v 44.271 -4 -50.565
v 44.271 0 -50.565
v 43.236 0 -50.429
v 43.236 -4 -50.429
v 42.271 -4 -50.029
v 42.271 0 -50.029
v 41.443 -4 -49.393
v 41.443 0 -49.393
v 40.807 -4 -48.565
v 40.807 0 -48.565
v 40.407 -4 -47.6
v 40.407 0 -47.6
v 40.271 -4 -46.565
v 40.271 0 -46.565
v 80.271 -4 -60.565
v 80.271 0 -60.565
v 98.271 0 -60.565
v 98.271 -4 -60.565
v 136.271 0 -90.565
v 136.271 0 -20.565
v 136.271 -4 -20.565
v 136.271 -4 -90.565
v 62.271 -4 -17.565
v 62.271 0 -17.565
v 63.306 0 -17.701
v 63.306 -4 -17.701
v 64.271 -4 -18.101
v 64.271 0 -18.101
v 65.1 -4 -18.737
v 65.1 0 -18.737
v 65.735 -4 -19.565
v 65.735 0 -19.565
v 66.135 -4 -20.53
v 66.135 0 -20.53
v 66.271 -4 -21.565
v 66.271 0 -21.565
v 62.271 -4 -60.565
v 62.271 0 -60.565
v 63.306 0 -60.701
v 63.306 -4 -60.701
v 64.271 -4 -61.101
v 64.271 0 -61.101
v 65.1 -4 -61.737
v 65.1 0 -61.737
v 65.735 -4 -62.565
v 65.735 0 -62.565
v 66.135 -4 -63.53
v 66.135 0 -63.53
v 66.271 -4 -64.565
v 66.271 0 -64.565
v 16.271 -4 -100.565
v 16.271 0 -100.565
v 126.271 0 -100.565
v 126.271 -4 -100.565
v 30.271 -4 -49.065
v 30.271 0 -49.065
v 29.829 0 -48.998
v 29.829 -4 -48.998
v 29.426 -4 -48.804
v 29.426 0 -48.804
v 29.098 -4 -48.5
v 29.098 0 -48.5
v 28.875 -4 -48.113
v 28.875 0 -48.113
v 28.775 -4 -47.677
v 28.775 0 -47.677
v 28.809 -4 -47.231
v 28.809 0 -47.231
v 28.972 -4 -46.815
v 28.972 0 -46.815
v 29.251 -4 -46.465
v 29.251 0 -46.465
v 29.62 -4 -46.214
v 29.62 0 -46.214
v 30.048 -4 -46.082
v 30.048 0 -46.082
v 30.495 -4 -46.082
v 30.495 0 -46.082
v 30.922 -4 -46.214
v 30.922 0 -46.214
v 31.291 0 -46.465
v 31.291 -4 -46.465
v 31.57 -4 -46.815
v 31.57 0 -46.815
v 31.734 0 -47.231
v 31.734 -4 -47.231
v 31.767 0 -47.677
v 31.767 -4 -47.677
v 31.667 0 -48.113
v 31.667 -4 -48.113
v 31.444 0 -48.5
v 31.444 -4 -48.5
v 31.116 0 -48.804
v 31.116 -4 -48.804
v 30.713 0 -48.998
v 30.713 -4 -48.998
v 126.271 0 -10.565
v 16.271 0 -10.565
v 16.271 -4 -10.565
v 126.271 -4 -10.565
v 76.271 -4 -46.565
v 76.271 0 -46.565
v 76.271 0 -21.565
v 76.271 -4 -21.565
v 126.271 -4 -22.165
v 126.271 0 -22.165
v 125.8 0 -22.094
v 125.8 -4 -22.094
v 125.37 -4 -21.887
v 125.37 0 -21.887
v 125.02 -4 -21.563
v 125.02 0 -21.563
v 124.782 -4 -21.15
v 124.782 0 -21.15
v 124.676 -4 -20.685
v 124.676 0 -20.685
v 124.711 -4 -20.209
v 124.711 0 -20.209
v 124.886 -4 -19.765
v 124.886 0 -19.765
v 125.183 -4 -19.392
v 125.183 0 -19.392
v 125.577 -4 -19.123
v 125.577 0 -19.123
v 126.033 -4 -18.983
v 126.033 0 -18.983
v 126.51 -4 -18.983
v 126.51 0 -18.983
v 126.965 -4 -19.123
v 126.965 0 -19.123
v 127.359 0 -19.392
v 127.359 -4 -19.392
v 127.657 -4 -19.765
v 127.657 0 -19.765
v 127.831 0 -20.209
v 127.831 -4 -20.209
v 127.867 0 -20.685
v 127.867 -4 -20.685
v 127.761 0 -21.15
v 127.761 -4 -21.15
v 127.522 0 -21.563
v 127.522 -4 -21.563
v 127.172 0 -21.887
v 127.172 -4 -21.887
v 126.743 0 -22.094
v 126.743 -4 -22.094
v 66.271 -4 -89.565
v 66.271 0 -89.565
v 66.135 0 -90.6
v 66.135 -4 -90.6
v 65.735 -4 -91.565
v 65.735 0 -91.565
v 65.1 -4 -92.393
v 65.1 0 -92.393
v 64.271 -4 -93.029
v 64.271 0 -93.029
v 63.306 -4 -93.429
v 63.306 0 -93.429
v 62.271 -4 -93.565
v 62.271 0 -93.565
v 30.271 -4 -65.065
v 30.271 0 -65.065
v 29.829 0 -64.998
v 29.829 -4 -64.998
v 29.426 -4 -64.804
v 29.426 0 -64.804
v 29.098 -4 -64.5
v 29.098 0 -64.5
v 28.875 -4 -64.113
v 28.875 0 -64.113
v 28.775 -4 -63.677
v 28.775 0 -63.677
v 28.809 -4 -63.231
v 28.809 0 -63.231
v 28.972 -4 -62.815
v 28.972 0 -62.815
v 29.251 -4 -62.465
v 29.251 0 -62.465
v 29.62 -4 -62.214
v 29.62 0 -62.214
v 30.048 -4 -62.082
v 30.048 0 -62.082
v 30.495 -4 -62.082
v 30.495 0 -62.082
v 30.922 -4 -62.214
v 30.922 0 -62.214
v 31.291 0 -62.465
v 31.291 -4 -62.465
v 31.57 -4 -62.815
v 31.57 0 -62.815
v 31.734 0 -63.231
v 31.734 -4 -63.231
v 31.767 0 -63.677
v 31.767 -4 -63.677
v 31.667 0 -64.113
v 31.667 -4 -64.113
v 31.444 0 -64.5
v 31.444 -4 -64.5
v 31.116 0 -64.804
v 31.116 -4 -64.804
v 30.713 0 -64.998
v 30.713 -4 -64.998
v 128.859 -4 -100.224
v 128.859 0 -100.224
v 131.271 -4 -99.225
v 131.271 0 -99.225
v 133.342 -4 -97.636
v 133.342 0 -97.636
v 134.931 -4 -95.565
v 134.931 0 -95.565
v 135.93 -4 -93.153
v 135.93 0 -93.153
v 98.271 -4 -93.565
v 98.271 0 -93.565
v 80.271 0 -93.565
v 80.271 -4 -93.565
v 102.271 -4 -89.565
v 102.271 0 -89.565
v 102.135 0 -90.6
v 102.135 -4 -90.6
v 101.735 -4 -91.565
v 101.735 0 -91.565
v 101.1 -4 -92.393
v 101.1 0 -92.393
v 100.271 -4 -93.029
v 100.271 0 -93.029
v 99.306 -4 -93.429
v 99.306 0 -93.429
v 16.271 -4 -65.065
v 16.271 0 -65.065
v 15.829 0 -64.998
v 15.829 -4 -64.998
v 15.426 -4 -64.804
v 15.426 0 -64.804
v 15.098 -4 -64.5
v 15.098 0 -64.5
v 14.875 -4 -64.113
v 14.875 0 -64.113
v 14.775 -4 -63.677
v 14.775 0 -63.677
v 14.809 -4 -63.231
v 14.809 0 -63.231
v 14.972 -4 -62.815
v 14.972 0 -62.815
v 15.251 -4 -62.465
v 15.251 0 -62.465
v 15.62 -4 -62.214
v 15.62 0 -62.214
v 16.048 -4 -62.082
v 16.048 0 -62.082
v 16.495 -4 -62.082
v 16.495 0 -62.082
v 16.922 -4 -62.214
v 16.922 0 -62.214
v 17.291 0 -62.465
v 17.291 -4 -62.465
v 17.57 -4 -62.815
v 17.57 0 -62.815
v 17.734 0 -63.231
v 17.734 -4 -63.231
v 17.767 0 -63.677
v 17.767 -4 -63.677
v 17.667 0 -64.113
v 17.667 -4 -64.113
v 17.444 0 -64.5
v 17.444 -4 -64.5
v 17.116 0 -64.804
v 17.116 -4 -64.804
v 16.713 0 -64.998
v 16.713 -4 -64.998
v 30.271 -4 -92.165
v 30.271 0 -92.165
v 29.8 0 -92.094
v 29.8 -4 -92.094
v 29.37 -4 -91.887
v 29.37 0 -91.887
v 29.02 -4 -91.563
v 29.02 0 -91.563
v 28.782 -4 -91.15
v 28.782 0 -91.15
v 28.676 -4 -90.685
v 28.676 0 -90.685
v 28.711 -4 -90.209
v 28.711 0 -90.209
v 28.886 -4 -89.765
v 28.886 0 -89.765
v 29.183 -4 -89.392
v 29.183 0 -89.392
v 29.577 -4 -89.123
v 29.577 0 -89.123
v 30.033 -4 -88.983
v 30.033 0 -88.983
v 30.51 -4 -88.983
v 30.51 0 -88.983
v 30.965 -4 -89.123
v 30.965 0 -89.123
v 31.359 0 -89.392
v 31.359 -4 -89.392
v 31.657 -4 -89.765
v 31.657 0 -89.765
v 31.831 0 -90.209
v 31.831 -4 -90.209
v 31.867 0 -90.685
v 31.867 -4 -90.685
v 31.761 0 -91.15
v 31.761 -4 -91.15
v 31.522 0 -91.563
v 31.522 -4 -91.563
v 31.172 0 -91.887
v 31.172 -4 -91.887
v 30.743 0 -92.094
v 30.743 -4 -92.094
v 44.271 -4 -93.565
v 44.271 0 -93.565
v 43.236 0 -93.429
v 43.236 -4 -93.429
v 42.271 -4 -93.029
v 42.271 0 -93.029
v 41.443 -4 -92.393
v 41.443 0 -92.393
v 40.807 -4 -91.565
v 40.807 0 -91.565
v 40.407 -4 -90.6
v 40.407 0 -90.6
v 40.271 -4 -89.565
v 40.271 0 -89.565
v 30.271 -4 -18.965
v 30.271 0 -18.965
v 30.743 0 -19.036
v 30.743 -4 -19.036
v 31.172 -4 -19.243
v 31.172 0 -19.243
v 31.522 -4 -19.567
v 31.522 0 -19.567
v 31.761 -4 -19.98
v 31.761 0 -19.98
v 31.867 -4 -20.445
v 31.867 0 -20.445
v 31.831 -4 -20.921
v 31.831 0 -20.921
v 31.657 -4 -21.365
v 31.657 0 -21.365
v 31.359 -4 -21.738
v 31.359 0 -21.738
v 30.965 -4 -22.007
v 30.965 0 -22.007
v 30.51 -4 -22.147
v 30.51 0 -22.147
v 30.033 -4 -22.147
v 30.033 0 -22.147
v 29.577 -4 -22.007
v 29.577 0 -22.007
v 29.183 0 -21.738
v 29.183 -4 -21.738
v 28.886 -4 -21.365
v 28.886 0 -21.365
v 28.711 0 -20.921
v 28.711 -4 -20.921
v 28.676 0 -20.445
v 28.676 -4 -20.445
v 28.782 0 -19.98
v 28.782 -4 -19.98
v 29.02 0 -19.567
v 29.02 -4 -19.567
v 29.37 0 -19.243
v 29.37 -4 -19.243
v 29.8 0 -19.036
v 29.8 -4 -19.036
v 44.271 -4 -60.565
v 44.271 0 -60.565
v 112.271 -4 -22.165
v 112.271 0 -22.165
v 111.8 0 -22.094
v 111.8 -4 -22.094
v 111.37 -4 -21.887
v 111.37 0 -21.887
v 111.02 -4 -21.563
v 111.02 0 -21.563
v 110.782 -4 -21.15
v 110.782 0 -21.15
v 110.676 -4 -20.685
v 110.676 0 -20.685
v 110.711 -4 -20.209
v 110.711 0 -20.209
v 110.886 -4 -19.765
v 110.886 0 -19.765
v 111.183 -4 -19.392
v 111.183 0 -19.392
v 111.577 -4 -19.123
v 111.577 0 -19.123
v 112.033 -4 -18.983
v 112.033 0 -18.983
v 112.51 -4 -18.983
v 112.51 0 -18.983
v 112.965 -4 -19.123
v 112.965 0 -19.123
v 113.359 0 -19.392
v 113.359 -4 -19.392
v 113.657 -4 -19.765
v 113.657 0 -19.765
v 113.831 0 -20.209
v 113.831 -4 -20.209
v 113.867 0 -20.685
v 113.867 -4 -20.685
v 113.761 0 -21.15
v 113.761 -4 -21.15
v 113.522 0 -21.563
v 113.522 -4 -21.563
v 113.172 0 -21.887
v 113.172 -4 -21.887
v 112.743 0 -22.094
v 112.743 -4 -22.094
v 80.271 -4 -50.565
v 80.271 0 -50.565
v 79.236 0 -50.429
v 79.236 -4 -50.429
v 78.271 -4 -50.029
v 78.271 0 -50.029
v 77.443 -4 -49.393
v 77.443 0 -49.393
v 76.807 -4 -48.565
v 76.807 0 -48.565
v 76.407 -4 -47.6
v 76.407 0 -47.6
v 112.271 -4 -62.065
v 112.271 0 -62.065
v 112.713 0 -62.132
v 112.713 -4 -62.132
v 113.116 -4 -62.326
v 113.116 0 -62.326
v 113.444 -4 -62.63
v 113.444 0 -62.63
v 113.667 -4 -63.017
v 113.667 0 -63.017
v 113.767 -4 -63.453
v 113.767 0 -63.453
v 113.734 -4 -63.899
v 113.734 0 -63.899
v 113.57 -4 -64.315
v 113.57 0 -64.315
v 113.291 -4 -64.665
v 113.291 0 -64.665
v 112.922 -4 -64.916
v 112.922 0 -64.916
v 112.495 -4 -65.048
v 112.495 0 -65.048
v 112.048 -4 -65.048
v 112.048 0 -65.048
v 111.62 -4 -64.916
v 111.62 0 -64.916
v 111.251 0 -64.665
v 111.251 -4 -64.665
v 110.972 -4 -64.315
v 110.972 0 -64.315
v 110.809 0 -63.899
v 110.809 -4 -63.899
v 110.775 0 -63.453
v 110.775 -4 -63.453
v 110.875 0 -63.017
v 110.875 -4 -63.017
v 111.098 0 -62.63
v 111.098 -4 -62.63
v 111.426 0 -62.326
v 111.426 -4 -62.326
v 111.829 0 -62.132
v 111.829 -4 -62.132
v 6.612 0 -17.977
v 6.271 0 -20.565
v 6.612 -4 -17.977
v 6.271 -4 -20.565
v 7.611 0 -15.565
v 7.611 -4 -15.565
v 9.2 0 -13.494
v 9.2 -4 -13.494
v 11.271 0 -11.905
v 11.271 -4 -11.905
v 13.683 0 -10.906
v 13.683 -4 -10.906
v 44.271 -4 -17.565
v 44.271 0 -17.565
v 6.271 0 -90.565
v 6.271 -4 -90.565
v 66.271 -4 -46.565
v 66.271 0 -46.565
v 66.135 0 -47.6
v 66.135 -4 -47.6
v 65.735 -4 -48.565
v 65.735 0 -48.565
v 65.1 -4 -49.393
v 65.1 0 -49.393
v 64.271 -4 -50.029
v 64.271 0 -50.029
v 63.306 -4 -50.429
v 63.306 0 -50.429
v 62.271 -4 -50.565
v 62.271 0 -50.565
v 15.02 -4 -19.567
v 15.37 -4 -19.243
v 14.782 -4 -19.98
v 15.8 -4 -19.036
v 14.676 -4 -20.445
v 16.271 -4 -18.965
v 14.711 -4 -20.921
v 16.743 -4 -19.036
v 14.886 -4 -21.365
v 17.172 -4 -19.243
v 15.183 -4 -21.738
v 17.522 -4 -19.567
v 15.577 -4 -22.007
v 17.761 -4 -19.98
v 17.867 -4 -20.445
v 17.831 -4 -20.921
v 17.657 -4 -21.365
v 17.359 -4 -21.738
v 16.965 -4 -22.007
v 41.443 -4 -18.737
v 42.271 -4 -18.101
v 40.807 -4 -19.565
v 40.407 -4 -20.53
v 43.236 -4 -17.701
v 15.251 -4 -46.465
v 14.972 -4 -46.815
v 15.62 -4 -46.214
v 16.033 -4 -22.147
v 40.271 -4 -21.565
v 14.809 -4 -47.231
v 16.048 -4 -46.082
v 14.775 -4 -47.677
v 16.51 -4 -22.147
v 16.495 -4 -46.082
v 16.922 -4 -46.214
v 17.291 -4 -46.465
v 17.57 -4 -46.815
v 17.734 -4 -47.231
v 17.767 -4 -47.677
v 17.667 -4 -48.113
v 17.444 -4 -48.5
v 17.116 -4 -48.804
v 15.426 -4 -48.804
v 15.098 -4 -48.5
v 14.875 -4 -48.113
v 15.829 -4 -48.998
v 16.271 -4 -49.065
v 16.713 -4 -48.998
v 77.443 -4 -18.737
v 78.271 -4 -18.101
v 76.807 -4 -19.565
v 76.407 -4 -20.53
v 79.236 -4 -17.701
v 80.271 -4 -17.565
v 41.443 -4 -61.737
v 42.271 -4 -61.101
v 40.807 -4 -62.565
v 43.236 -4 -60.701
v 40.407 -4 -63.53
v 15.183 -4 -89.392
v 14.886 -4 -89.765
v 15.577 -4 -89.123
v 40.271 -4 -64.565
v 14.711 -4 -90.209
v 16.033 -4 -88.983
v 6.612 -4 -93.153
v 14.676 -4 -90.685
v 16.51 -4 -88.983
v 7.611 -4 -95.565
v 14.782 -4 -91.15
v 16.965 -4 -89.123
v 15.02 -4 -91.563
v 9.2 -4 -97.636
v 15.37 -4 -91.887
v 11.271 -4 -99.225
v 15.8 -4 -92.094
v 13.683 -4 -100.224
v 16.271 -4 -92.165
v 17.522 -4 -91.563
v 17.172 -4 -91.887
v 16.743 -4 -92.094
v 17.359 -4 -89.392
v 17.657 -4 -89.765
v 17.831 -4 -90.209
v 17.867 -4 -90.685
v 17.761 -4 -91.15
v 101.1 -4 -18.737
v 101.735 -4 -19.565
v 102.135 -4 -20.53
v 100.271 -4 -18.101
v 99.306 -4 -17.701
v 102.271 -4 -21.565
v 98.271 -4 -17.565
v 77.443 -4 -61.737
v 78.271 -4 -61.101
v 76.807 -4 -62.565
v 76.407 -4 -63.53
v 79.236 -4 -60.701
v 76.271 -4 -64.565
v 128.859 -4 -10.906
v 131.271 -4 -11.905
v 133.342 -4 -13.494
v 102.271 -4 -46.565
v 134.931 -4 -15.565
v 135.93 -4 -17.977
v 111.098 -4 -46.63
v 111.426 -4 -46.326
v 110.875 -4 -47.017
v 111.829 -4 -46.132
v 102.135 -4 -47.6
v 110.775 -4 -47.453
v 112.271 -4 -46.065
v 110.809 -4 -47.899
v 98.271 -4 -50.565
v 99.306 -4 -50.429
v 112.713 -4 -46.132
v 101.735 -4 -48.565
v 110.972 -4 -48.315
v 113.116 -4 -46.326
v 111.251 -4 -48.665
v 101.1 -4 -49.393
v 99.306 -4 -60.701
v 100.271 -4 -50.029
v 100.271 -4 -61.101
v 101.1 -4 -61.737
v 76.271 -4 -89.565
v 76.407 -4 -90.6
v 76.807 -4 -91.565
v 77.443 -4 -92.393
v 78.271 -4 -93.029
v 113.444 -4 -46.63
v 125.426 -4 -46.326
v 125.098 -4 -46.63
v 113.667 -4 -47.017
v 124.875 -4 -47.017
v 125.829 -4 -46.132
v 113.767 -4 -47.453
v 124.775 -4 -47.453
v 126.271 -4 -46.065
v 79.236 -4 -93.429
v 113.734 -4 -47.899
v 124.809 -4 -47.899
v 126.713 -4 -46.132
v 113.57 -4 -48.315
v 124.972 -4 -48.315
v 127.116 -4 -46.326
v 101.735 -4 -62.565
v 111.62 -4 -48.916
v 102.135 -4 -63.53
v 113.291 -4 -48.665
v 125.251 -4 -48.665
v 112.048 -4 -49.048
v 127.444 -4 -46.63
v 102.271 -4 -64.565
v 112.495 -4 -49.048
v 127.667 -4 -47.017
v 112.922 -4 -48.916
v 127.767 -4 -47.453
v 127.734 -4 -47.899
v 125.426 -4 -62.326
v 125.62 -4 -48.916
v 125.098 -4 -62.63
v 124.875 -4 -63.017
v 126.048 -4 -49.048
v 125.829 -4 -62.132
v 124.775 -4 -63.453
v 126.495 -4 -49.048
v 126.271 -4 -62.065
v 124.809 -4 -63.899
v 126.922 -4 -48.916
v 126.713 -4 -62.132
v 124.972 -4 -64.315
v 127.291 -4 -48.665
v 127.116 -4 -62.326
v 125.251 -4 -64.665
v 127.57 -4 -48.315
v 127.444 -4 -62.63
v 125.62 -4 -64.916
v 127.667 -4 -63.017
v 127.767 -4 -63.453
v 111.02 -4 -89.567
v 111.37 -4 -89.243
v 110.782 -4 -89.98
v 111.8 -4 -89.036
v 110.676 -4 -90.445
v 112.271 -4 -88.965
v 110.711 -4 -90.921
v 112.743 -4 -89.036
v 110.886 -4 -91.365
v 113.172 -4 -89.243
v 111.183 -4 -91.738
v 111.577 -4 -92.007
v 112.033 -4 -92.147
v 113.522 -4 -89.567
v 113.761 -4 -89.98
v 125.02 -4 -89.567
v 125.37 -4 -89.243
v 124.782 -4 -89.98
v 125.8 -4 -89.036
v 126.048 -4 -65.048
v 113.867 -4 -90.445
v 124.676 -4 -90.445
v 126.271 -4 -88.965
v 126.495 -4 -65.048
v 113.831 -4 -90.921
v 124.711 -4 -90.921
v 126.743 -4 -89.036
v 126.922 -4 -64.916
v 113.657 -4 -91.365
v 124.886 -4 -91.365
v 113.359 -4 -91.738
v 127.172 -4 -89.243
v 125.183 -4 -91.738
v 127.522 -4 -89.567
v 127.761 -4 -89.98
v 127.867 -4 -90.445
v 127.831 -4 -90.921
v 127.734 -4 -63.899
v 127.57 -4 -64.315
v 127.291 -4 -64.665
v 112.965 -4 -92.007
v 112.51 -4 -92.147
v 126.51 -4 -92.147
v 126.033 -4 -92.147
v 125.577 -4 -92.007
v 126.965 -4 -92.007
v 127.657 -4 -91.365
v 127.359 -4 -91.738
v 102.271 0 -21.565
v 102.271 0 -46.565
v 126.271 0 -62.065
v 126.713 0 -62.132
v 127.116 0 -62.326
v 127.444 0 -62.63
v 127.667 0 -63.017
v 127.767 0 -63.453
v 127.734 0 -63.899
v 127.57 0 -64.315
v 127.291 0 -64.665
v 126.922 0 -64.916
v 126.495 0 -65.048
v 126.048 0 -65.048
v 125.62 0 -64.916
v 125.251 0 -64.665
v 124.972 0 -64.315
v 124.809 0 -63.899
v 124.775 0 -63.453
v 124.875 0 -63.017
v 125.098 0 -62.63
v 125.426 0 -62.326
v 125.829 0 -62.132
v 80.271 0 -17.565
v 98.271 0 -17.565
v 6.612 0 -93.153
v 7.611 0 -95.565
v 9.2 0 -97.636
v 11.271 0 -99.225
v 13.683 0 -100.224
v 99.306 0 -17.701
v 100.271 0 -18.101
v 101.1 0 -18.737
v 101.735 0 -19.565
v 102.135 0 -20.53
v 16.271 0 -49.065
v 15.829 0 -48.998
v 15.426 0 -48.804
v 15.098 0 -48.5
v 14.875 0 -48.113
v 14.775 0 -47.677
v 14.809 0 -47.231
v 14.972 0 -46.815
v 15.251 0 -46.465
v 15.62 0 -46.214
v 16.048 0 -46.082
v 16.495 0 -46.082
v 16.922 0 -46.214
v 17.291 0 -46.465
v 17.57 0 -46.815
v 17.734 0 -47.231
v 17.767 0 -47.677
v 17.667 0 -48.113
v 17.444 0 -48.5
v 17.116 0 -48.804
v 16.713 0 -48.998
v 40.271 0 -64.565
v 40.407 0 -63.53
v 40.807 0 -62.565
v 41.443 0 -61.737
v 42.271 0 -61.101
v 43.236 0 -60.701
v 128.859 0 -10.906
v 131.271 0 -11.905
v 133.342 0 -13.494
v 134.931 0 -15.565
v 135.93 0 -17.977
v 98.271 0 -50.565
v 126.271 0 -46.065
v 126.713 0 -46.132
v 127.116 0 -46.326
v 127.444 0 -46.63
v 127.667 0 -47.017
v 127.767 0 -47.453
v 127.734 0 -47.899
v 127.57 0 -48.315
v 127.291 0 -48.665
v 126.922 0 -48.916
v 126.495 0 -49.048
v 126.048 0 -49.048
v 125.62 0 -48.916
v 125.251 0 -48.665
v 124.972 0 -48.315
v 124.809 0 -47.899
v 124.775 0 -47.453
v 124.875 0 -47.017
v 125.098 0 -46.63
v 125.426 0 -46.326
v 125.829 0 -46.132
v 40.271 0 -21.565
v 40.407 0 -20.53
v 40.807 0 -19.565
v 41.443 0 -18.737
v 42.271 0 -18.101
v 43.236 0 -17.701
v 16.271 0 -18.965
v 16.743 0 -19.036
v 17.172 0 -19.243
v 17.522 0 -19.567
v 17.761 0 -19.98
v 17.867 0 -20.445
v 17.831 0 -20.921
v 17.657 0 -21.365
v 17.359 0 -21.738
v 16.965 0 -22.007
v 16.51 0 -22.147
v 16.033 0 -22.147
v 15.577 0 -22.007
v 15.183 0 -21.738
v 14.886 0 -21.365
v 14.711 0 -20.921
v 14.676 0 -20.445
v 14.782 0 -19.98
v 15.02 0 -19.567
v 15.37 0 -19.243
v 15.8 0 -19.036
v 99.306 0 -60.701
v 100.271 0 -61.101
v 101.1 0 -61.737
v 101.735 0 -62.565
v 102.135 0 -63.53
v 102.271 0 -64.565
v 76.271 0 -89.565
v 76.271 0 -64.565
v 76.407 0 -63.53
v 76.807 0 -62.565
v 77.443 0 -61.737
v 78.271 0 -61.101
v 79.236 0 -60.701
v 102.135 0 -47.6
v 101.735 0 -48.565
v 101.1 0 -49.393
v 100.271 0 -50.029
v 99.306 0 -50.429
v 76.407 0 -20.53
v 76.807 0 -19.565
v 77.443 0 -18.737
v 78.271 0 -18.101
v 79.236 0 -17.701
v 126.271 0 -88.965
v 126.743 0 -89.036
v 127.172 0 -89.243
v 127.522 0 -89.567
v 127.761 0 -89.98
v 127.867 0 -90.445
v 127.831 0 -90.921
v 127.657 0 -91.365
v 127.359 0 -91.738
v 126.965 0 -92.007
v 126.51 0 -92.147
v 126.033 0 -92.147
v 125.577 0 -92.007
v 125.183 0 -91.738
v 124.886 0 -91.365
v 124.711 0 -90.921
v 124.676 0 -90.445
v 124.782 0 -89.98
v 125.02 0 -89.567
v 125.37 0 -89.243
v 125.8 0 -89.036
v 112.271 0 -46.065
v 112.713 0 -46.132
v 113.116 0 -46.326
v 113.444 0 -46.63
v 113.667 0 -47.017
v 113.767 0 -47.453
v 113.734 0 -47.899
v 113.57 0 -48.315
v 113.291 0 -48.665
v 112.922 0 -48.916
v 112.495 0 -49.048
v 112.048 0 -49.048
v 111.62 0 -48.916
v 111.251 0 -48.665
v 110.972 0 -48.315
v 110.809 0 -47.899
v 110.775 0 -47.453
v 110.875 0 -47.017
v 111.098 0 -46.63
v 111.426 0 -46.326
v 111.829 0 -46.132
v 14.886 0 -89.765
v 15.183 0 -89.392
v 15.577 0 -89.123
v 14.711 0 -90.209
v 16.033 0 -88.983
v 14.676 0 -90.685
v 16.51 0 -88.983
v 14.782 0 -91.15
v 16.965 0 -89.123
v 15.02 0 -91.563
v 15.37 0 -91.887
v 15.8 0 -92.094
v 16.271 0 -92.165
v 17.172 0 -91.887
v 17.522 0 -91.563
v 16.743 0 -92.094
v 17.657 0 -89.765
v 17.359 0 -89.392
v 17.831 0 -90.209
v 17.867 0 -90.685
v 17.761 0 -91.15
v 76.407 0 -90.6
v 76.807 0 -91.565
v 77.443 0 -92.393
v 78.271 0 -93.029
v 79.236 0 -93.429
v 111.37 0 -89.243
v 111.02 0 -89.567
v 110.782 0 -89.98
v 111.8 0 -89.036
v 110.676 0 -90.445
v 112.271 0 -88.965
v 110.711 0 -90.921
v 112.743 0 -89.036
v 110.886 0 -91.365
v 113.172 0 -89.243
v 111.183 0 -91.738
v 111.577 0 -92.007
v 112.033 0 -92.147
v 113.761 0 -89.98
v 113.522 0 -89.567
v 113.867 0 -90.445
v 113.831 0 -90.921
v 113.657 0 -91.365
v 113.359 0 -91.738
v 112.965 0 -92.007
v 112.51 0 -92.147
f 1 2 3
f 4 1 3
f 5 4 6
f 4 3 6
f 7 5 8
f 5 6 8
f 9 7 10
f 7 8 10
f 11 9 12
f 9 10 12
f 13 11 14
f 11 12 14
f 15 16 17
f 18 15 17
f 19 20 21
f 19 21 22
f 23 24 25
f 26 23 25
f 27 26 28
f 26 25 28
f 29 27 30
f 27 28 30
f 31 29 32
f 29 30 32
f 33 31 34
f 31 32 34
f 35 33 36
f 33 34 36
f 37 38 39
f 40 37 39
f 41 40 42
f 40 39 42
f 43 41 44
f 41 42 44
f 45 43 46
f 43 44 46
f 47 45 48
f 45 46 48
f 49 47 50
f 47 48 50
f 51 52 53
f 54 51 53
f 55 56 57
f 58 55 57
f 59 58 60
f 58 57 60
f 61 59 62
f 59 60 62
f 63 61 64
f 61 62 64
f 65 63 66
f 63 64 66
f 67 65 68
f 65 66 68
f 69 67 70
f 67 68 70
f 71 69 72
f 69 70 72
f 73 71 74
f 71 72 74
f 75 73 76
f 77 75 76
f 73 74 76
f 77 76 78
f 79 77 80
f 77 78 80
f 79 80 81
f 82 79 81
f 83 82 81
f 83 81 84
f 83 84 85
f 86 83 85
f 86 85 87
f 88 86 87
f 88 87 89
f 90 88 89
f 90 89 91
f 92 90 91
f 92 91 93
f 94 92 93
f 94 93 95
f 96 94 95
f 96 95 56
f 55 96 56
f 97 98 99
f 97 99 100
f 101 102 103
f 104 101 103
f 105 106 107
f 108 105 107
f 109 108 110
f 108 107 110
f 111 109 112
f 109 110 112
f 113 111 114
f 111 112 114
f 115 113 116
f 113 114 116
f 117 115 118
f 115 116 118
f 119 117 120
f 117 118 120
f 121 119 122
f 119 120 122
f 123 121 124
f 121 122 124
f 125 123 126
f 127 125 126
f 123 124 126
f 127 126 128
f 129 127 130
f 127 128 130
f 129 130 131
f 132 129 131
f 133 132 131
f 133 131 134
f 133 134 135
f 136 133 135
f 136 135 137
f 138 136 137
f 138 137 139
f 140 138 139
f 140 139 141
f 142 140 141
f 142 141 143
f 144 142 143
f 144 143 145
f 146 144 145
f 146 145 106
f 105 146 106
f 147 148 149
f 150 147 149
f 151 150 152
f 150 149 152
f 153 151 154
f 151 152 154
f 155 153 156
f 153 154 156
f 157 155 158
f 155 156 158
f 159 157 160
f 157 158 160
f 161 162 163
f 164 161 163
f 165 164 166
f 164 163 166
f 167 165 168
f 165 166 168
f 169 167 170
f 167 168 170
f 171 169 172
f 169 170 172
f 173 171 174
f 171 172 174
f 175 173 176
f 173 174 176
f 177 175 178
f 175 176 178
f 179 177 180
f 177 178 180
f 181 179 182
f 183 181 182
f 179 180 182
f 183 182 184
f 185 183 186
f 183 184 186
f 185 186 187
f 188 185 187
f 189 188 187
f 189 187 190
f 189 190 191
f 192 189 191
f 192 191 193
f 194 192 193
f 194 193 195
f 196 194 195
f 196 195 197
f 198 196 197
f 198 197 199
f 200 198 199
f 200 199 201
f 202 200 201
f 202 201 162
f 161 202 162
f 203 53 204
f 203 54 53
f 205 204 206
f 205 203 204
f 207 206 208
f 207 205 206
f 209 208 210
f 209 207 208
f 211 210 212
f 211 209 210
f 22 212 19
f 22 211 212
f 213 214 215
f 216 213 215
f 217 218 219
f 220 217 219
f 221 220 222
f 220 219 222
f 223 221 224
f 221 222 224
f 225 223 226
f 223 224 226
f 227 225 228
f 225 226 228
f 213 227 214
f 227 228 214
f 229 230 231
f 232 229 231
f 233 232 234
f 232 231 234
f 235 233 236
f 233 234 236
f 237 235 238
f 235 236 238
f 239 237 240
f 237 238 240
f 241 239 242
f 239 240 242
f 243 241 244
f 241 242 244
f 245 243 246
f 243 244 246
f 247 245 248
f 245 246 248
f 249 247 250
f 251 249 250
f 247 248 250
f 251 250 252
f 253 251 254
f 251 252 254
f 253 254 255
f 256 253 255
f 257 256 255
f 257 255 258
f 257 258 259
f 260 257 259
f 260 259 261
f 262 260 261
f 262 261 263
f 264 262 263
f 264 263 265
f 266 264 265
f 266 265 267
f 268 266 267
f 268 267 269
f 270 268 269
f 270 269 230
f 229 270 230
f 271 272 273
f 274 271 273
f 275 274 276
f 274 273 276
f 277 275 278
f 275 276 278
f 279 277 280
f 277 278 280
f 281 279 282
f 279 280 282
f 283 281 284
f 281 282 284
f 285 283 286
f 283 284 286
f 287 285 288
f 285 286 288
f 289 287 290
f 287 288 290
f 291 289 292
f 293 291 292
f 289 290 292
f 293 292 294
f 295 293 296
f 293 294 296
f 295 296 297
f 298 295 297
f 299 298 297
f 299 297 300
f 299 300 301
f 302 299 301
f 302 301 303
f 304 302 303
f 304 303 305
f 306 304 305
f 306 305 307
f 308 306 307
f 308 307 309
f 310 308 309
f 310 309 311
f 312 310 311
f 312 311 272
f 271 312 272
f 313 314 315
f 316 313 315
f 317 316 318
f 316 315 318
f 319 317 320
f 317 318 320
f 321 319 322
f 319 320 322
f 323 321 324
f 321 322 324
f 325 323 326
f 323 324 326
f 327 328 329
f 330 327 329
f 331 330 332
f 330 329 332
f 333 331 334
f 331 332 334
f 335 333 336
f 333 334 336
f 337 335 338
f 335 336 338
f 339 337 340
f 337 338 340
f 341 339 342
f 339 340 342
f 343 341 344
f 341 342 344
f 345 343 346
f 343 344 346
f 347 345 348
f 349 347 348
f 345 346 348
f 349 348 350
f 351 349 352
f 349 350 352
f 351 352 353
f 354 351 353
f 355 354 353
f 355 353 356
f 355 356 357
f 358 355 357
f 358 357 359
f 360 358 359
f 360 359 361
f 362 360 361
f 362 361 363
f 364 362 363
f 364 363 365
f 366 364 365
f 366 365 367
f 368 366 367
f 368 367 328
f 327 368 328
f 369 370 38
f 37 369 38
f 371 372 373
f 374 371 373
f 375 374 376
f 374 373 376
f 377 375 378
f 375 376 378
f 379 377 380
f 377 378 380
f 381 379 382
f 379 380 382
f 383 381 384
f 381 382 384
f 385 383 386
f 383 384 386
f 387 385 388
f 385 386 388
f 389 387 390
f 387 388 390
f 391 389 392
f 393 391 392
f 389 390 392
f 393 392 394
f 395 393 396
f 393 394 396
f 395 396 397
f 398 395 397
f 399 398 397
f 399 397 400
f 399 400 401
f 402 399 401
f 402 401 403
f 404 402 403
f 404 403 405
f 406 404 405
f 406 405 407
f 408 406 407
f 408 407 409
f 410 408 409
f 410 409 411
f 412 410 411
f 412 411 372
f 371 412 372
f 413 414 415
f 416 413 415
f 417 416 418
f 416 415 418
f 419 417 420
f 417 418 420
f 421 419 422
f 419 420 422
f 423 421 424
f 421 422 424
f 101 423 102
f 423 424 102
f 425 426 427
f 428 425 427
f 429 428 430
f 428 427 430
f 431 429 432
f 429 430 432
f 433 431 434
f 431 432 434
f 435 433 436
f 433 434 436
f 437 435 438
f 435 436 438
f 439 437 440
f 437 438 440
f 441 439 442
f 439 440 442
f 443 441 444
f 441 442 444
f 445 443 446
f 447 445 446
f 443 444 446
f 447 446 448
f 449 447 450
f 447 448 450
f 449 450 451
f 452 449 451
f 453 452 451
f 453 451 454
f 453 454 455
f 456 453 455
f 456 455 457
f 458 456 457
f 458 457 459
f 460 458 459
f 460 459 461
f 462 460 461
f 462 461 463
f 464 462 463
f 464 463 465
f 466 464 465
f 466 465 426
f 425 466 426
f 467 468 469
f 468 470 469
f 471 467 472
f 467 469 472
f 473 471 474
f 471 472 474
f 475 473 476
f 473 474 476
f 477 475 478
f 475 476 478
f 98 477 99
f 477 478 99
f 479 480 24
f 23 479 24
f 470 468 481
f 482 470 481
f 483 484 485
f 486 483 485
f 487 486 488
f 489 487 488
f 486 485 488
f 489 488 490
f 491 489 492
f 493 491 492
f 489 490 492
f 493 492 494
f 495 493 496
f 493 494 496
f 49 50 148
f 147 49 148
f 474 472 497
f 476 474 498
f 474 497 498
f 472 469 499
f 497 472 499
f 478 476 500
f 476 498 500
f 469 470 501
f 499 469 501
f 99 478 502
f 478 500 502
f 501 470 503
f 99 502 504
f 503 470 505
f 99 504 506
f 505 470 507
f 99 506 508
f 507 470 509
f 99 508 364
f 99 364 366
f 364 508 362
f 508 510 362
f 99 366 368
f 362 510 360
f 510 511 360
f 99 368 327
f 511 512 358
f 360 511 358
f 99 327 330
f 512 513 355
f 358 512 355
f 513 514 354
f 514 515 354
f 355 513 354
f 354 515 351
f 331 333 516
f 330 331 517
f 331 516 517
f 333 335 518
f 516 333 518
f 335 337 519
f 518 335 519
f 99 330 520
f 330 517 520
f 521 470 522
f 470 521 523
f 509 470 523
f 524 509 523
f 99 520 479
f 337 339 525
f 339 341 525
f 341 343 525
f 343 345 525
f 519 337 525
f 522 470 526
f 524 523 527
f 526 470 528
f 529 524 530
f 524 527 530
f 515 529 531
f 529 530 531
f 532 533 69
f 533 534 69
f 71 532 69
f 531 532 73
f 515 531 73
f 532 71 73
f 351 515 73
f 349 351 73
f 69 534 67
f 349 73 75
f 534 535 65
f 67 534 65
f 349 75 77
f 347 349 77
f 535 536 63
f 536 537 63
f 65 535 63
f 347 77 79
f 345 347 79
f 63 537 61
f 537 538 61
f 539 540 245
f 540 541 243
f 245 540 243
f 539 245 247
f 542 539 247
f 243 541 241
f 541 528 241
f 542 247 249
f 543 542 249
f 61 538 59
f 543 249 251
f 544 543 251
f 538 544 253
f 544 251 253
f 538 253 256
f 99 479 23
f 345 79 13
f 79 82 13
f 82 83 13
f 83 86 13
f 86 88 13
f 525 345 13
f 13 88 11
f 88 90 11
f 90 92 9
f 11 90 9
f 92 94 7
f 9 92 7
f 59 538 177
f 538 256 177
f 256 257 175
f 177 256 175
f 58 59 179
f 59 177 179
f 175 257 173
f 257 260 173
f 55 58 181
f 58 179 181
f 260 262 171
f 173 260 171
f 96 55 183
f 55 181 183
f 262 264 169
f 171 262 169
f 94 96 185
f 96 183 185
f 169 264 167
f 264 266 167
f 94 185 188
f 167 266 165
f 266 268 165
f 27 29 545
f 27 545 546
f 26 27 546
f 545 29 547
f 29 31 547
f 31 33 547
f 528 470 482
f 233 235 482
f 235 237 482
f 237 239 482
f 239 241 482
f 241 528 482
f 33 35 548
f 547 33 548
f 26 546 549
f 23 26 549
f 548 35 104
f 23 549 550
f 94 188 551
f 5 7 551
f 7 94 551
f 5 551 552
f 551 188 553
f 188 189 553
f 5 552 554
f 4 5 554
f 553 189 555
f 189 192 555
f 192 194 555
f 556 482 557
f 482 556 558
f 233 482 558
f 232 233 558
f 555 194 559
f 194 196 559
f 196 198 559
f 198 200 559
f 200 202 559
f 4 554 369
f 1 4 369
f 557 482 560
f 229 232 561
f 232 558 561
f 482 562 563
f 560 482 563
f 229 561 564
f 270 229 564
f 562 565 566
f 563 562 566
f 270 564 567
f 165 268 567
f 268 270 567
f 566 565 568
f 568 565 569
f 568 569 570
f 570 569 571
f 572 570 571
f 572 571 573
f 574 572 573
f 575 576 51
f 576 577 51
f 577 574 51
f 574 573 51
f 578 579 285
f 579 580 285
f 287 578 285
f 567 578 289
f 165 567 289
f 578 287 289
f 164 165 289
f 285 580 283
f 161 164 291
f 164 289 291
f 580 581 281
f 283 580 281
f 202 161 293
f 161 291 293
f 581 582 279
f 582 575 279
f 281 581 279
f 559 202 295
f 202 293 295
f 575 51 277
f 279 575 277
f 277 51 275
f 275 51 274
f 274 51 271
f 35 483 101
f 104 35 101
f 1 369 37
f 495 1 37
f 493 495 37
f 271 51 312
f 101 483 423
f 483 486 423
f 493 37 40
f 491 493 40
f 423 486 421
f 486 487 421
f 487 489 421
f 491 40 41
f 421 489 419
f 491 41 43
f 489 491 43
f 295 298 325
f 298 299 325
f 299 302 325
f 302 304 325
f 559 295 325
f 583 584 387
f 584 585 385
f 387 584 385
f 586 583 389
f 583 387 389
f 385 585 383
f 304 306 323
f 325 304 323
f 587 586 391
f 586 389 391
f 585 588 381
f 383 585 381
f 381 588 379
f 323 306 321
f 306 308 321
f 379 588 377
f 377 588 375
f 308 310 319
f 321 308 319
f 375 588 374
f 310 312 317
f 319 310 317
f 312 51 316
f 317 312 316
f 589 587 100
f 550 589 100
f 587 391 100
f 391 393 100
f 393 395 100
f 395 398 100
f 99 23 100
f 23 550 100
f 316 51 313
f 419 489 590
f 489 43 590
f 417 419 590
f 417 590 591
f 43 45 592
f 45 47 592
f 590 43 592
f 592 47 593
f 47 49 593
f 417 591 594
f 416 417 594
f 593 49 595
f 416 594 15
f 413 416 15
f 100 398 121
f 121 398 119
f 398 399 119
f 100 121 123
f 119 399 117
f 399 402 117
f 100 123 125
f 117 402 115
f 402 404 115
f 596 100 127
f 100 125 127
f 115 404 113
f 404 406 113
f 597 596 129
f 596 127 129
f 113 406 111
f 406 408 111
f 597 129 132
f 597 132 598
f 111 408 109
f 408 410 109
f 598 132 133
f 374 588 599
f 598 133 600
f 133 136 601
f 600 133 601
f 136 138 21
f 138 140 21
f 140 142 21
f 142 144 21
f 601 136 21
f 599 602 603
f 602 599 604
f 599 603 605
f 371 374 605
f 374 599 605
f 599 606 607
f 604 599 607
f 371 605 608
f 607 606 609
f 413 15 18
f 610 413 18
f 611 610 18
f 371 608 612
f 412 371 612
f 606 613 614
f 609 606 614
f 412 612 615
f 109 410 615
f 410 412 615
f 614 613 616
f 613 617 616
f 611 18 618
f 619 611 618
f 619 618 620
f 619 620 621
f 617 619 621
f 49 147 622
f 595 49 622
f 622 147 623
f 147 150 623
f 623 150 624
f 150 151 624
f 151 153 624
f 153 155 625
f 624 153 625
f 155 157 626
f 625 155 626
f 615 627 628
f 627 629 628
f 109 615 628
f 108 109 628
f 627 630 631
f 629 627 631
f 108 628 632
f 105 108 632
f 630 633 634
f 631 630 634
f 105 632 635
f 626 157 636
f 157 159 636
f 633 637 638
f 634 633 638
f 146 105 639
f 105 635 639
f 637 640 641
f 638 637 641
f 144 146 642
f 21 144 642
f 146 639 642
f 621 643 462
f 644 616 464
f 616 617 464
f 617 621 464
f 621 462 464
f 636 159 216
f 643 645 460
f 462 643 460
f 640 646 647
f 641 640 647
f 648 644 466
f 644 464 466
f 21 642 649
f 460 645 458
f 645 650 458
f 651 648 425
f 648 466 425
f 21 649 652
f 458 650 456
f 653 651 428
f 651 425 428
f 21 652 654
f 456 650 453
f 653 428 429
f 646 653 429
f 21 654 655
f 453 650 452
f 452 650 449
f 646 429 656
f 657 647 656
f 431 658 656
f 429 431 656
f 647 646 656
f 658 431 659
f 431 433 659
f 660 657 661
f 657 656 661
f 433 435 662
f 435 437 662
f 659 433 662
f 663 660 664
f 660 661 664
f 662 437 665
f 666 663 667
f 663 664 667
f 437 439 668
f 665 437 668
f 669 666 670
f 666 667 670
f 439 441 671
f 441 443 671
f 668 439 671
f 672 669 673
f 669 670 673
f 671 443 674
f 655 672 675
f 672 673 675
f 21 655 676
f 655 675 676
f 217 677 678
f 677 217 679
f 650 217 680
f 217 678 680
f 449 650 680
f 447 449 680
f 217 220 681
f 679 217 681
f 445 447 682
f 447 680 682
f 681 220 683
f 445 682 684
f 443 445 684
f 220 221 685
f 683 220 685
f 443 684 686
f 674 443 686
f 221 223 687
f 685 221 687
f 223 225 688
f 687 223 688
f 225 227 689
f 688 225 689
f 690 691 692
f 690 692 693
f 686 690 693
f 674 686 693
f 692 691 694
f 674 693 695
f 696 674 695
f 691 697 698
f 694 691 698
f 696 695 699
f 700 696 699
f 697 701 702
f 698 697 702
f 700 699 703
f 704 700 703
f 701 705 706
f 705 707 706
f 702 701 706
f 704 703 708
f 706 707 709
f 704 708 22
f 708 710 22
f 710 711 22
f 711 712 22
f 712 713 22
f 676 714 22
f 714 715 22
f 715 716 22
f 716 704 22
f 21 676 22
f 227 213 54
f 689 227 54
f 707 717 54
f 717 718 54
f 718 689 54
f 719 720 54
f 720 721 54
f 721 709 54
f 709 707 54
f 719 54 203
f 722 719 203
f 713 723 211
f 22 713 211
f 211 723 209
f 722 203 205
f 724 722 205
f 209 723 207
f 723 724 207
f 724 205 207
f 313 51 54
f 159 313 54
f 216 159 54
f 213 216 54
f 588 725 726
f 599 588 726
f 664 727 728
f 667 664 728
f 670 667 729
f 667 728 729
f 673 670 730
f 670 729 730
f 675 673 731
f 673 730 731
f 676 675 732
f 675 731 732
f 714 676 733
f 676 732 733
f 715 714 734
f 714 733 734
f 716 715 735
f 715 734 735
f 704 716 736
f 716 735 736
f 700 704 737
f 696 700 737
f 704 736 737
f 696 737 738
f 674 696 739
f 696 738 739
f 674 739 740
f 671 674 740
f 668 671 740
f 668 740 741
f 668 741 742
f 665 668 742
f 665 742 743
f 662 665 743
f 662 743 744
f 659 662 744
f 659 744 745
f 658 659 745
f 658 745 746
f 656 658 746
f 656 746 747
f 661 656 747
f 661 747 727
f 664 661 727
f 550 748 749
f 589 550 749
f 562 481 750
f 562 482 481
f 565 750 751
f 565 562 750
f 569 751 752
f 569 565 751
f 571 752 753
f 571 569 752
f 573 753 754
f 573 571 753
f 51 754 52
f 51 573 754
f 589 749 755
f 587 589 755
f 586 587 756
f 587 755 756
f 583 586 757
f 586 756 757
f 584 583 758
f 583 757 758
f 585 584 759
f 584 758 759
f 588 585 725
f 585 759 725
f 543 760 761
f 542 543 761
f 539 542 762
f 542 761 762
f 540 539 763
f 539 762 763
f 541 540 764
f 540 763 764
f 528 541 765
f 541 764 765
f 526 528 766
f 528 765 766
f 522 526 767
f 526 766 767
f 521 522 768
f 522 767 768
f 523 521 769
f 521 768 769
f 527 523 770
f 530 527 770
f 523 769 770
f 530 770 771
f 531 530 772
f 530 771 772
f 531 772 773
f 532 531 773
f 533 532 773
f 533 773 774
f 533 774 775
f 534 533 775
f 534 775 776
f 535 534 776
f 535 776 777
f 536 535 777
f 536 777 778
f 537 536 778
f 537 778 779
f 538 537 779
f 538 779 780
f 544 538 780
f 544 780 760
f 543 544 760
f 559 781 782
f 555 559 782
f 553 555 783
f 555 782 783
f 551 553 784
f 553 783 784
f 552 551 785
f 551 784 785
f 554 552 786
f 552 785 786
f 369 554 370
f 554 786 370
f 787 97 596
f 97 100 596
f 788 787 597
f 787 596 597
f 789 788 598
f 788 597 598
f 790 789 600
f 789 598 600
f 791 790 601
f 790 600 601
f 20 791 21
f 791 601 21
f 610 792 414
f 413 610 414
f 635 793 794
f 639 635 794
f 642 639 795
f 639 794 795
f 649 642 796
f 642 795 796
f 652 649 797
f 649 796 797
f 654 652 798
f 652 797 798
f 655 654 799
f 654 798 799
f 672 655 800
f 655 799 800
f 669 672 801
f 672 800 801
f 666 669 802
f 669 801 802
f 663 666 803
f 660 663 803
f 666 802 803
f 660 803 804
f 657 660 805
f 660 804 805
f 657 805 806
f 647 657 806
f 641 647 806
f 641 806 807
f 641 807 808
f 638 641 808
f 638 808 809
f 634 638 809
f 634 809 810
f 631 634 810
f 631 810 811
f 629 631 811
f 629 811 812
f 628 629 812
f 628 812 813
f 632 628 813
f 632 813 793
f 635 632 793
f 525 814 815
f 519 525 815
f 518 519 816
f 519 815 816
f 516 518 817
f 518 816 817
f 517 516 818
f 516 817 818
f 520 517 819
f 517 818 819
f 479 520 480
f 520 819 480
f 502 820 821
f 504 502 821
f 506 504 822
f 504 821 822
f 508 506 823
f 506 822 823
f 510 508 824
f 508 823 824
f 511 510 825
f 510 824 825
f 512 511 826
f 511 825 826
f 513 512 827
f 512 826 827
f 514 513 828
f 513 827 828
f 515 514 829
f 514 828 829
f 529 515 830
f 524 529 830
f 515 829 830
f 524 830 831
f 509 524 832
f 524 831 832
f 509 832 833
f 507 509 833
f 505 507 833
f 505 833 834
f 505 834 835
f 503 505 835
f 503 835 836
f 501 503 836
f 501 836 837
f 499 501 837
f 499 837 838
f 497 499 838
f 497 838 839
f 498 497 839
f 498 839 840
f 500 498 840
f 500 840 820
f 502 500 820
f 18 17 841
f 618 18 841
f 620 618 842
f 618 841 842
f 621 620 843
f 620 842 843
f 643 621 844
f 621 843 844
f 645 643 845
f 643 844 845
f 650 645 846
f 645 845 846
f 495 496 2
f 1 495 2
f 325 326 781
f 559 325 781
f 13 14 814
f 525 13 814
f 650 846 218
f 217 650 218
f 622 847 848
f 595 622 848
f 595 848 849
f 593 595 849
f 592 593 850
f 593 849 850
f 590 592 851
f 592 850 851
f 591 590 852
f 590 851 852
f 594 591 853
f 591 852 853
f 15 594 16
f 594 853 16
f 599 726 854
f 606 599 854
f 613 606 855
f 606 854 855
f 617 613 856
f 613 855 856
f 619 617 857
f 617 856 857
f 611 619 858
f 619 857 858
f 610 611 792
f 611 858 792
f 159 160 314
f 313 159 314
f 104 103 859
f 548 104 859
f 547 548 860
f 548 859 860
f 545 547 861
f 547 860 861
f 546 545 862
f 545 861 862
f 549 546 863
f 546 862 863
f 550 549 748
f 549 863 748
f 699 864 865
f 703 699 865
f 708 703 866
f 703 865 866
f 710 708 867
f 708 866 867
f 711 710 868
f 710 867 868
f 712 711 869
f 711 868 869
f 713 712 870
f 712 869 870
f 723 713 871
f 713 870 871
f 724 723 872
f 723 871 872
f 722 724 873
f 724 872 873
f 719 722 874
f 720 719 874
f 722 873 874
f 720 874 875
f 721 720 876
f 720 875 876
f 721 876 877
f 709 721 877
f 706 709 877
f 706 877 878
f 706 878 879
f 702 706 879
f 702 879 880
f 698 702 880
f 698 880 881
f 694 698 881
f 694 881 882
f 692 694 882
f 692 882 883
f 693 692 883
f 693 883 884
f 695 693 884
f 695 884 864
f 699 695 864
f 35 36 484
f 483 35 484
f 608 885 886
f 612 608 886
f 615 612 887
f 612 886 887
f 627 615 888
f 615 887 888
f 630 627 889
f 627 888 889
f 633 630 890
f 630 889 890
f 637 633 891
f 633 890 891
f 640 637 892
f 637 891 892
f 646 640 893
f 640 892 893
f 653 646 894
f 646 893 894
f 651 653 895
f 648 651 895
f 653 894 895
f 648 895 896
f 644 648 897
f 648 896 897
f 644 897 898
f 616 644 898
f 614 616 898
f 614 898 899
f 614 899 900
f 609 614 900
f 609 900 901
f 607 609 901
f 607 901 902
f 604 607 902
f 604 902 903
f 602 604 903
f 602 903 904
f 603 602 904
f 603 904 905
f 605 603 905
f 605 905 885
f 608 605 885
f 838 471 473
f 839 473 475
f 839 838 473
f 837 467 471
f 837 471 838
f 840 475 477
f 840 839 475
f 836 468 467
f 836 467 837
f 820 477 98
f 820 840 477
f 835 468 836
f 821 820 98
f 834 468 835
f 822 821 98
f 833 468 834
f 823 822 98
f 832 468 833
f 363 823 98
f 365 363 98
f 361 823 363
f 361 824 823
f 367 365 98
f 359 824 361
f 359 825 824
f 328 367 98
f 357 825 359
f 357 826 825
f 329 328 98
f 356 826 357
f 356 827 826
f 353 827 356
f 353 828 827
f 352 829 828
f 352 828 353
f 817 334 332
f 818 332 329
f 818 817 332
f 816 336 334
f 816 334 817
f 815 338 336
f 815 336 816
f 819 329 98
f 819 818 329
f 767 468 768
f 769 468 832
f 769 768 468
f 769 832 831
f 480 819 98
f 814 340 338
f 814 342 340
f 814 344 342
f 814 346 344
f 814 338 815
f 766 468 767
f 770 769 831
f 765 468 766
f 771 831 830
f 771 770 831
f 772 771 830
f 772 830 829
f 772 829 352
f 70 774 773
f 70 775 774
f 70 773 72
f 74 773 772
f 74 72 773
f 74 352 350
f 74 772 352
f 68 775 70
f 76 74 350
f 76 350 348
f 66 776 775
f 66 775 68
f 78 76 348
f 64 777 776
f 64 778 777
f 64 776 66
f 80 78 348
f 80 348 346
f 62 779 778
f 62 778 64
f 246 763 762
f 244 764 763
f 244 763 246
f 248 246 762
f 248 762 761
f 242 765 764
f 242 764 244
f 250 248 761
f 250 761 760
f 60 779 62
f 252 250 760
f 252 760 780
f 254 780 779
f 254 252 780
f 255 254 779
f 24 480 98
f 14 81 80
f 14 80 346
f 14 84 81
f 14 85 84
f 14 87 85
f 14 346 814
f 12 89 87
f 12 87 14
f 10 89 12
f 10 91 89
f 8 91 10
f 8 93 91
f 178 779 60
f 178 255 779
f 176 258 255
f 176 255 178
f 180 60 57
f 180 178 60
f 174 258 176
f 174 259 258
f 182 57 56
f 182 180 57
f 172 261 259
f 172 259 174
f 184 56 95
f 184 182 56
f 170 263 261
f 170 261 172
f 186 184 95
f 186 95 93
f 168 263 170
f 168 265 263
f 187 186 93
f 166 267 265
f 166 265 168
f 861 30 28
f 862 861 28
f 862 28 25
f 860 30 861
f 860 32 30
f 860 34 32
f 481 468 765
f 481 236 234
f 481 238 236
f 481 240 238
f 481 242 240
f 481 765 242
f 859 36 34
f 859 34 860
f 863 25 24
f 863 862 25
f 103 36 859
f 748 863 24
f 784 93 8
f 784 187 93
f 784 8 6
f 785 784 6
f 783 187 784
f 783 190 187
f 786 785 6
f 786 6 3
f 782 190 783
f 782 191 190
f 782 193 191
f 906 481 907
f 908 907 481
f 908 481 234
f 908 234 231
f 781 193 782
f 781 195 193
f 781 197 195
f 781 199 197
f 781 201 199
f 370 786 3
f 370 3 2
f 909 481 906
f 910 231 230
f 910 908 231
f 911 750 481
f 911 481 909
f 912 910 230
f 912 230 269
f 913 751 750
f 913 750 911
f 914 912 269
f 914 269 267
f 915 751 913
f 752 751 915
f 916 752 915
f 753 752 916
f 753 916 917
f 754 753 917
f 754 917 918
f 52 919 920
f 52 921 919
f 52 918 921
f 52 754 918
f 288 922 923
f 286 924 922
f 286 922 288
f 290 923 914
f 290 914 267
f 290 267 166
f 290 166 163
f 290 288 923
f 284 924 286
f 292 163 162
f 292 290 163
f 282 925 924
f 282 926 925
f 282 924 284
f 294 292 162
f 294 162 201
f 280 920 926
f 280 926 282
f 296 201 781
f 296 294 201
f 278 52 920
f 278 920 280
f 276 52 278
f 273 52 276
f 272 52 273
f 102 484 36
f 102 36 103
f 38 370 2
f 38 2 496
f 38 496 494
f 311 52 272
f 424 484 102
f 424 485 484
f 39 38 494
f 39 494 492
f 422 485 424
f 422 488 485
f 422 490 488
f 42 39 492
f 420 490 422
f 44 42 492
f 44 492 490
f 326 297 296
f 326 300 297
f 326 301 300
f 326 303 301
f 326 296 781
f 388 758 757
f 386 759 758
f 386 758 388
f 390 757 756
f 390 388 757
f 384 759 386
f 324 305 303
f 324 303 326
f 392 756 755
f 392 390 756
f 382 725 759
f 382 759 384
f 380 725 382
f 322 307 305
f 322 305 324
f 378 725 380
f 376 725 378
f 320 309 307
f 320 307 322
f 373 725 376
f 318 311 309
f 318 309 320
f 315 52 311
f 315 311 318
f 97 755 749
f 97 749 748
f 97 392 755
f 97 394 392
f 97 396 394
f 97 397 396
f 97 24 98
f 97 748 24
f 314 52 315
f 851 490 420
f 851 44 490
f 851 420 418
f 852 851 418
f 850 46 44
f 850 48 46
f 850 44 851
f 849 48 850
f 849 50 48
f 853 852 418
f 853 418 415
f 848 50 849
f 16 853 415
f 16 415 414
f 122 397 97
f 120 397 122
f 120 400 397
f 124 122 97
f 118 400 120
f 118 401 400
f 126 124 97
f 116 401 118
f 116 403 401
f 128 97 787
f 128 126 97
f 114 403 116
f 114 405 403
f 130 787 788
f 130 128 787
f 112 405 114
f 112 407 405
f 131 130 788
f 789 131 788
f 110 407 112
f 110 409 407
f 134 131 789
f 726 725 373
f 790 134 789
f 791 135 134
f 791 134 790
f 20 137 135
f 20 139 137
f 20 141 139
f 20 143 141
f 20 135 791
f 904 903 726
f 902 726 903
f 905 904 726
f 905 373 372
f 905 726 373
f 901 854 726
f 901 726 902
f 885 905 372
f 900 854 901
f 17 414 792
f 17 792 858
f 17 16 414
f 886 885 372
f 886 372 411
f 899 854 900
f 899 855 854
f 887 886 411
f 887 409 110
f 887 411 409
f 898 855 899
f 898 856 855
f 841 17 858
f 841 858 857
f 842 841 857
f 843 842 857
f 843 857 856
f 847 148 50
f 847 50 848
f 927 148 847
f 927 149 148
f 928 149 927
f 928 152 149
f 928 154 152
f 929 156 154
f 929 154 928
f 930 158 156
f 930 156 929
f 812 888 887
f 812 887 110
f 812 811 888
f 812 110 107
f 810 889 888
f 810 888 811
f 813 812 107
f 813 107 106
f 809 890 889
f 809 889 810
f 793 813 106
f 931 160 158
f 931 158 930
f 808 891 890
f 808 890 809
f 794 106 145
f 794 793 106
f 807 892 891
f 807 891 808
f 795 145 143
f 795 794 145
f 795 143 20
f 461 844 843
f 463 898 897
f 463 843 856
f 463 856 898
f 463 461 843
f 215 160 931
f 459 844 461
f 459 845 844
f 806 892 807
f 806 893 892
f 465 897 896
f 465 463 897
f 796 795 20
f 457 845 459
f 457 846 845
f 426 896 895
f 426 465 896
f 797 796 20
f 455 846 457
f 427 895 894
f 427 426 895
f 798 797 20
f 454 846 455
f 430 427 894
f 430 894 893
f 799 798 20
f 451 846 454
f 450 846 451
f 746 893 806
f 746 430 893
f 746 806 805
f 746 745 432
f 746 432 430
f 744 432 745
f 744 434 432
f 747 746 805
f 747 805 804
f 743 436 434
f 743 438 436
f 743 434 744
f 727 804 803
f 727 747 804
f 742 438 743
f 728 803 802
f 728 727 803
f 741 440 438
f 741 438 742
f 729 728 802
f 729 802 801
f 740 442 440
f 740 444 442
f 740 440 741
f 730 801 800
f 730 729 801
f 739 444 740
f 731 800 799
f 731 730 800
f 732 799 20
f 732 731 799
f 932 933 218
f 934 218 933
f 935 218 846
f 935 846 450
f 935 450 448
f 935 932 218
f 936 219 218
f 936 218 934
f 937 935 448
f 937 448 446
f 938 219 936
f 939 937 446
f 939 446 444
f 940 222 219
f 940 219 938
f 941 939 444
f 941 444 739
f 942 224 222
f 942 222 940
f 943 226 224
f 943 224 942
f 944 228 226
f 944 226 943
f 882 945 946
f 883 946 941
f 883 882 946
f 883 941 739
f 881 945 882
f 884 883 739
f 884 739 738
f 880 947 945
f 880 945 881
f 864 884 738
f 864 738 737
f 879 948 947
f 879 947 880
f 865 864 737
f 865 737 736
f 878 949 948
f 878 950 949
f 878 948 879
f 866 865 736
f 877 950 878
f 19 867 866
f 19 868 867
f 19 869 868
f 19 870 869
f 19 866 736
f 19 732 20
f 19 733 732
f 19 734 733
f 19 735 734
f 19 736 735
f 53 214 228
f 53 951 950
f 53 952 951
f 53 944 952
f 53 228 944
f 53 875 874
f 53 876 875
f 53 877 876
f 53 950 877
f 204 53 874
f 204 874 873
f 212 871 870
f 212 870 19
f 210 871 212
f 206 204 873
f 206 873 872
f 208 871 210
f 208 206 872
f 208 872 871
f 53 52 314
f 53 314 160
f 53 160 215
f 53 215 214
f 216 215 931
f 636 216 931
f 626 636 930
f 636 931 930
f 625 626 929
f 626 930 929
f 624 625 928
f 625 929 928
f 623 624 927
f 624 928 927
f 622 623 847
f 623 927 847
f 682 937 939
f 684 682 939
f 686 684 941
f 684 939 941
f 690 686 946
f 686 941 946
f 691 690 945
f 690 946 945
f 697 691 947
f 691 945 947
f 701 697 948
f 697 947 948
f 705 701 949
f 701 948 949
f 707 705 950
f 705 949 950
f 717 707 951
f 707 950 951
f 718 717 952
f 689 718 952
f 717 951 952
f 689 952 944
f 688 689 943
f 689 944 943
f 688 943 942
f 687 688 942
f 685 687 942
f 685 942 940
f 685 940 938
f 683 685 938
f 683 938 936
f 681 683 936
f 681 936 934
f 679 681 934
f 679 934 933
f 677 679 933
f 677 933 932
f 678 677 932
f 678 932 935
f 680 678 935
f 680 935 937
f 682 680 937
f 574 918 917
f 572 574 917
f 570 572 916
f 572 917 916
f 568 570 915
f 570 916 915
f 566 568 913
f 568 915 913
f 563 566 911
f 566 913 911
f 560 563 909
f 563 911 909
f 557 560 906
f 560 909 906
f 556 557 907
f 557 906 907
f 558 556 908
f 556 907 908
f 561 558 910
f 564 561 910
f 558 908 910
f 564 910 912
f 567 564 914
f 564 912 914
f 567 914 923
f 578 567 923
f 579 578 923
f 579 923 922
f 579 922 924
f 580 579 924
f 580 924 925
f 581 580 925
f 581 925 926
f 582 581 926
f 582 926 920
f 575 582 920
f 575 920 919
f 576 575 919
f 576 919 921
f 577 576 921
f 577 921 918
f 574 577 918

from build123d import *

# Parameters (mm, degrees)
SKETCH2_W           = 130
SKETCH2_H           = 90
BOSS_EXTRUDE1_DEPTH = 4
SKETCH3_R           = 1.5
CUT_EXTRUDE1_DEPTH  = 10
SKETCH4_R           = 1.6
CUT_EXTRUDE2_DEPTH  = 10
FILLET1_R           = 10
CUT_EXTRUDE3_DEPTH  = 10


with BuildPart() as part:
    # Sketch2 → Boss-Extrude1 (new body)
    with BuildSketch(Plane(origin=(0, 0, 0), x_dir=(1, 0, 0), z_dir=(0, 1, 0))):
        with Locations((71.271186441, 55.564971751)):
            Rectangle(SKETCH2_W, SKETCH2_H)
    extrude(amount=-BOSS_EXTRUDE1_DEPTH)

    # Sketch3 → Cut-Extrude1 (cut)
    with BuildSketch(Plane(origin=(0, 0, 0), x_dir=(1, 0, 0), z_dir=(0, 1, 0))):
        with Locations(Location((126.271186441, 63.564971751, 0), (0, 0, 270))):
            Circle(SKETCH3_R)
        with Locations(Location((126.271186441, 47.564971751, 0), (0, 0, 270))):
            Circle(SKETCH3_R)
        with Locations(Location((112.271186441, 47.564971751, 0), (0, 0, 270))):
            Circle(SKETCH3_R)
        with Locations(Location((112.271186441, 63.564971751, 0), (0, 0, 270))):
            Circle(SKETCH3_R)
        with Locations(Location((16.271186441, 47.564971751, 0), (0, 0, 90))):
            Circle(SKETCH3_R)
        with Locations(Location((30.271186441, 47.564971751, 0), (0, 0, 90))):
            Circle(SKETCH3_R)
        with Locations(Location((16.271186441, 63.564971751, 0), (0, 0, 90))):
            Circle(SKETCH3_R)
        with Locations(Location((30.271186441, 63.564971751, 0), (0, 0, 90))):
            Circle(SKETCH3_R)
    extrude(amount=-CUT_EXTRUDE1_DEPTH, mode=Mode.SUBTRACT)

    # Sketch4 → Cut-Extrude2 (cut)
    with BuildSketch(Plane(origin=(0, 0, 0), x_dir=(1, 0, 0), z_dir=(0, 1, 0))):
        with Locations(Location((16.271186441, 20.564971751, 0), (0, 0, 270))):
            Circle(SKETCH4_R)
        with Locations(Location((30.271186441, 20.564971751, 0), (0, 0, 270))):
            Circle(SKETCH4_R)
        with Locations(Location((30.271186441, 90.564971751, 0), (0, 0, 90))):
            Circle(SKETCH4_R)
        with Locations(Location((16.271186441, 90.564971751, 0), (0, 0, 90))):
            Circle(SKETCH4_R)
        with Locations(Location((112.271186441, 20.564971751, 0), (0, 0, 90))):
            Circle(SKETCH4_R)
        with Locations(Location((126.271186441, 20.564971751, 0), (0, 0, 90))):
            Circle(SKETCH4_R)
        with Locations(Location((126.271186441, 90.564971751, 0), (0, 0, 270))):
            Circle(SKETCH4_R)
        with Locations(Location((112.271186441, 90.564971751, 0), (0, 0, 270))):
            Circle(SKETCH4_R)
    extrude(amount=-CUT_EXTRUDE2_DEPTH, mode=Mode.SUBTRACT)

    # Fillet1
    fillet1_edges = [part.edges().sort_by_distance(p)[0] for p in [
        (6.271186441, -2, -100.564971751),
        (136.271186441, -2, -100.564971751),
        (136.271186441, -2, -10.564971751),
        (6.271186441, -2, -10.564971751),
    ]]
    fillet(fillet1_edges, radius=FILLET1_R)

    # Sketch5 → Cut-Extrude3 (cut)
    with BuildSketch(Plane(origin=(0, 0, 0), x_dir=(1, 0, 0), z_dir=(0, 1, 0))):
        with BuildLine():
            Line((76.271186441, 89.564971751), (76.271186441, 64.564971751))
            ThreePointArc((76.271186441, 64.564971751), (77.442759316, 61.736544627), (80.271186441, 60.564971751))
            Line((80.271186441, 60.564971751), (98.271186441, 60.564971751))
            ThreePointArc((98.271186441, 60.564971751), (101.099613565, 61.736544627), (102.271186441, 64.564971751))
            Line((102.271186441, 64.564971751), (102.271186441, 89.564971751))
            ThreePointArc((102.271186441, 89.564971751), (101.099613565, 92.393398876), (98.271186441, 93.564971751))
            Line((98.271186441, 93.564971751), (80.271186441, 93.564971751))
            ThreePointArc((80.271186441, 93.564971751), (77.442759316, 92.393398876), (76.271186441, 89.564971751))
        make_face()
        with BuildLine():
            Line((40.271186441, 89.564971751), (40.271186441, 64.564971751))
            ThreePointArc((40.271186441, 64.564971751), (41.442759316, 61.736544627), (44.271186441, 60.564971751))
            Line((44.271186441, 60.564971751), (62.271186441, 60.564971751))
            ThreePointArc((62.271186441, 60.564971751), (65.099613565, 61.736544627), (66.271186441, 64.564971751))
            Line((66.271186441, 64.564971751), (66.271186441, 89.564971751))
            ThreePointArc((66.271186441, 89.564971751), (65.099613565, 92.393398876), (62.271186441, 93.564971751))
            Line((62.271186441, 93.564971751), (44.271186441, 93.564971751))
            ThreePointArc((44.271186441, 93.564971751), (41.442759316, 92.393398876), (40.271186441, 89.564971751))
        make_face()
        with BuildLine():
            Line((66.271186441, 21.564971751), (66.271186441, 46.564971751))
            ThreePointArc((66.271186441, 46.564971751), (65.099613565, 49.393398876), (62.271186441, 50.564971751))
            Line((62.271186441, 50.564971751), (44.271186441, 50.564971751))
            ThreePointArc((44.271186441, 50.564971751), (41.442759316, 49.393398876), (40.271186441, 46.564971751))
            Line((40.271186441, 46.564971751), (40.271186441, 21.564971751))
            ThreePointArc((40.271186441, 21.564971751), (41.442759316, 18.736544627), (44.271186441, 17.564971751))
            Line((44.271186441, 17.564971751), (62.271186441, 17.564971751))
            ThreePointArc((62.271186441, 17.564971751), (65.099613565, 18.736544627), (66.271186441, 21.564971751))
        make_face()
        with BuildLine():
            Line((102.271186441, 21.564971751), (102.271186441, 46.564971751))
            ThreePointArc((102.271186441, 46.564971751), (101.099613565, 49.393398876), (98.271186441, 50.564971751))
            Line((98.271186441, 50.564971751), (80.271186441, 50.564971751))
            ThreePointArc((80.271186441, 50.564971751), (77.442759316, 49.393398876), (76.271186441, 46.564971751))
            Line((76.271186441, 46.564971751), (76.271186441, 21.564971751))
            ThreePointArc((76.271186441, 21.564971751), (77.442759316, 18.736544627), (80.271186441, 17.564971751))
            Line((80.271186441, 17.564971751), (98.271186441, 17.564971751))
            ThreePointArc((98.271186441, 17.564971751), (101.099613565, 18.736544627), (102.271186441, 21.564971751))
        make_face()
    extrude(amount=-CUT_EXTRUDE3_DEPTH, mode=Mode.SUBTRACT)


solid = part.part
